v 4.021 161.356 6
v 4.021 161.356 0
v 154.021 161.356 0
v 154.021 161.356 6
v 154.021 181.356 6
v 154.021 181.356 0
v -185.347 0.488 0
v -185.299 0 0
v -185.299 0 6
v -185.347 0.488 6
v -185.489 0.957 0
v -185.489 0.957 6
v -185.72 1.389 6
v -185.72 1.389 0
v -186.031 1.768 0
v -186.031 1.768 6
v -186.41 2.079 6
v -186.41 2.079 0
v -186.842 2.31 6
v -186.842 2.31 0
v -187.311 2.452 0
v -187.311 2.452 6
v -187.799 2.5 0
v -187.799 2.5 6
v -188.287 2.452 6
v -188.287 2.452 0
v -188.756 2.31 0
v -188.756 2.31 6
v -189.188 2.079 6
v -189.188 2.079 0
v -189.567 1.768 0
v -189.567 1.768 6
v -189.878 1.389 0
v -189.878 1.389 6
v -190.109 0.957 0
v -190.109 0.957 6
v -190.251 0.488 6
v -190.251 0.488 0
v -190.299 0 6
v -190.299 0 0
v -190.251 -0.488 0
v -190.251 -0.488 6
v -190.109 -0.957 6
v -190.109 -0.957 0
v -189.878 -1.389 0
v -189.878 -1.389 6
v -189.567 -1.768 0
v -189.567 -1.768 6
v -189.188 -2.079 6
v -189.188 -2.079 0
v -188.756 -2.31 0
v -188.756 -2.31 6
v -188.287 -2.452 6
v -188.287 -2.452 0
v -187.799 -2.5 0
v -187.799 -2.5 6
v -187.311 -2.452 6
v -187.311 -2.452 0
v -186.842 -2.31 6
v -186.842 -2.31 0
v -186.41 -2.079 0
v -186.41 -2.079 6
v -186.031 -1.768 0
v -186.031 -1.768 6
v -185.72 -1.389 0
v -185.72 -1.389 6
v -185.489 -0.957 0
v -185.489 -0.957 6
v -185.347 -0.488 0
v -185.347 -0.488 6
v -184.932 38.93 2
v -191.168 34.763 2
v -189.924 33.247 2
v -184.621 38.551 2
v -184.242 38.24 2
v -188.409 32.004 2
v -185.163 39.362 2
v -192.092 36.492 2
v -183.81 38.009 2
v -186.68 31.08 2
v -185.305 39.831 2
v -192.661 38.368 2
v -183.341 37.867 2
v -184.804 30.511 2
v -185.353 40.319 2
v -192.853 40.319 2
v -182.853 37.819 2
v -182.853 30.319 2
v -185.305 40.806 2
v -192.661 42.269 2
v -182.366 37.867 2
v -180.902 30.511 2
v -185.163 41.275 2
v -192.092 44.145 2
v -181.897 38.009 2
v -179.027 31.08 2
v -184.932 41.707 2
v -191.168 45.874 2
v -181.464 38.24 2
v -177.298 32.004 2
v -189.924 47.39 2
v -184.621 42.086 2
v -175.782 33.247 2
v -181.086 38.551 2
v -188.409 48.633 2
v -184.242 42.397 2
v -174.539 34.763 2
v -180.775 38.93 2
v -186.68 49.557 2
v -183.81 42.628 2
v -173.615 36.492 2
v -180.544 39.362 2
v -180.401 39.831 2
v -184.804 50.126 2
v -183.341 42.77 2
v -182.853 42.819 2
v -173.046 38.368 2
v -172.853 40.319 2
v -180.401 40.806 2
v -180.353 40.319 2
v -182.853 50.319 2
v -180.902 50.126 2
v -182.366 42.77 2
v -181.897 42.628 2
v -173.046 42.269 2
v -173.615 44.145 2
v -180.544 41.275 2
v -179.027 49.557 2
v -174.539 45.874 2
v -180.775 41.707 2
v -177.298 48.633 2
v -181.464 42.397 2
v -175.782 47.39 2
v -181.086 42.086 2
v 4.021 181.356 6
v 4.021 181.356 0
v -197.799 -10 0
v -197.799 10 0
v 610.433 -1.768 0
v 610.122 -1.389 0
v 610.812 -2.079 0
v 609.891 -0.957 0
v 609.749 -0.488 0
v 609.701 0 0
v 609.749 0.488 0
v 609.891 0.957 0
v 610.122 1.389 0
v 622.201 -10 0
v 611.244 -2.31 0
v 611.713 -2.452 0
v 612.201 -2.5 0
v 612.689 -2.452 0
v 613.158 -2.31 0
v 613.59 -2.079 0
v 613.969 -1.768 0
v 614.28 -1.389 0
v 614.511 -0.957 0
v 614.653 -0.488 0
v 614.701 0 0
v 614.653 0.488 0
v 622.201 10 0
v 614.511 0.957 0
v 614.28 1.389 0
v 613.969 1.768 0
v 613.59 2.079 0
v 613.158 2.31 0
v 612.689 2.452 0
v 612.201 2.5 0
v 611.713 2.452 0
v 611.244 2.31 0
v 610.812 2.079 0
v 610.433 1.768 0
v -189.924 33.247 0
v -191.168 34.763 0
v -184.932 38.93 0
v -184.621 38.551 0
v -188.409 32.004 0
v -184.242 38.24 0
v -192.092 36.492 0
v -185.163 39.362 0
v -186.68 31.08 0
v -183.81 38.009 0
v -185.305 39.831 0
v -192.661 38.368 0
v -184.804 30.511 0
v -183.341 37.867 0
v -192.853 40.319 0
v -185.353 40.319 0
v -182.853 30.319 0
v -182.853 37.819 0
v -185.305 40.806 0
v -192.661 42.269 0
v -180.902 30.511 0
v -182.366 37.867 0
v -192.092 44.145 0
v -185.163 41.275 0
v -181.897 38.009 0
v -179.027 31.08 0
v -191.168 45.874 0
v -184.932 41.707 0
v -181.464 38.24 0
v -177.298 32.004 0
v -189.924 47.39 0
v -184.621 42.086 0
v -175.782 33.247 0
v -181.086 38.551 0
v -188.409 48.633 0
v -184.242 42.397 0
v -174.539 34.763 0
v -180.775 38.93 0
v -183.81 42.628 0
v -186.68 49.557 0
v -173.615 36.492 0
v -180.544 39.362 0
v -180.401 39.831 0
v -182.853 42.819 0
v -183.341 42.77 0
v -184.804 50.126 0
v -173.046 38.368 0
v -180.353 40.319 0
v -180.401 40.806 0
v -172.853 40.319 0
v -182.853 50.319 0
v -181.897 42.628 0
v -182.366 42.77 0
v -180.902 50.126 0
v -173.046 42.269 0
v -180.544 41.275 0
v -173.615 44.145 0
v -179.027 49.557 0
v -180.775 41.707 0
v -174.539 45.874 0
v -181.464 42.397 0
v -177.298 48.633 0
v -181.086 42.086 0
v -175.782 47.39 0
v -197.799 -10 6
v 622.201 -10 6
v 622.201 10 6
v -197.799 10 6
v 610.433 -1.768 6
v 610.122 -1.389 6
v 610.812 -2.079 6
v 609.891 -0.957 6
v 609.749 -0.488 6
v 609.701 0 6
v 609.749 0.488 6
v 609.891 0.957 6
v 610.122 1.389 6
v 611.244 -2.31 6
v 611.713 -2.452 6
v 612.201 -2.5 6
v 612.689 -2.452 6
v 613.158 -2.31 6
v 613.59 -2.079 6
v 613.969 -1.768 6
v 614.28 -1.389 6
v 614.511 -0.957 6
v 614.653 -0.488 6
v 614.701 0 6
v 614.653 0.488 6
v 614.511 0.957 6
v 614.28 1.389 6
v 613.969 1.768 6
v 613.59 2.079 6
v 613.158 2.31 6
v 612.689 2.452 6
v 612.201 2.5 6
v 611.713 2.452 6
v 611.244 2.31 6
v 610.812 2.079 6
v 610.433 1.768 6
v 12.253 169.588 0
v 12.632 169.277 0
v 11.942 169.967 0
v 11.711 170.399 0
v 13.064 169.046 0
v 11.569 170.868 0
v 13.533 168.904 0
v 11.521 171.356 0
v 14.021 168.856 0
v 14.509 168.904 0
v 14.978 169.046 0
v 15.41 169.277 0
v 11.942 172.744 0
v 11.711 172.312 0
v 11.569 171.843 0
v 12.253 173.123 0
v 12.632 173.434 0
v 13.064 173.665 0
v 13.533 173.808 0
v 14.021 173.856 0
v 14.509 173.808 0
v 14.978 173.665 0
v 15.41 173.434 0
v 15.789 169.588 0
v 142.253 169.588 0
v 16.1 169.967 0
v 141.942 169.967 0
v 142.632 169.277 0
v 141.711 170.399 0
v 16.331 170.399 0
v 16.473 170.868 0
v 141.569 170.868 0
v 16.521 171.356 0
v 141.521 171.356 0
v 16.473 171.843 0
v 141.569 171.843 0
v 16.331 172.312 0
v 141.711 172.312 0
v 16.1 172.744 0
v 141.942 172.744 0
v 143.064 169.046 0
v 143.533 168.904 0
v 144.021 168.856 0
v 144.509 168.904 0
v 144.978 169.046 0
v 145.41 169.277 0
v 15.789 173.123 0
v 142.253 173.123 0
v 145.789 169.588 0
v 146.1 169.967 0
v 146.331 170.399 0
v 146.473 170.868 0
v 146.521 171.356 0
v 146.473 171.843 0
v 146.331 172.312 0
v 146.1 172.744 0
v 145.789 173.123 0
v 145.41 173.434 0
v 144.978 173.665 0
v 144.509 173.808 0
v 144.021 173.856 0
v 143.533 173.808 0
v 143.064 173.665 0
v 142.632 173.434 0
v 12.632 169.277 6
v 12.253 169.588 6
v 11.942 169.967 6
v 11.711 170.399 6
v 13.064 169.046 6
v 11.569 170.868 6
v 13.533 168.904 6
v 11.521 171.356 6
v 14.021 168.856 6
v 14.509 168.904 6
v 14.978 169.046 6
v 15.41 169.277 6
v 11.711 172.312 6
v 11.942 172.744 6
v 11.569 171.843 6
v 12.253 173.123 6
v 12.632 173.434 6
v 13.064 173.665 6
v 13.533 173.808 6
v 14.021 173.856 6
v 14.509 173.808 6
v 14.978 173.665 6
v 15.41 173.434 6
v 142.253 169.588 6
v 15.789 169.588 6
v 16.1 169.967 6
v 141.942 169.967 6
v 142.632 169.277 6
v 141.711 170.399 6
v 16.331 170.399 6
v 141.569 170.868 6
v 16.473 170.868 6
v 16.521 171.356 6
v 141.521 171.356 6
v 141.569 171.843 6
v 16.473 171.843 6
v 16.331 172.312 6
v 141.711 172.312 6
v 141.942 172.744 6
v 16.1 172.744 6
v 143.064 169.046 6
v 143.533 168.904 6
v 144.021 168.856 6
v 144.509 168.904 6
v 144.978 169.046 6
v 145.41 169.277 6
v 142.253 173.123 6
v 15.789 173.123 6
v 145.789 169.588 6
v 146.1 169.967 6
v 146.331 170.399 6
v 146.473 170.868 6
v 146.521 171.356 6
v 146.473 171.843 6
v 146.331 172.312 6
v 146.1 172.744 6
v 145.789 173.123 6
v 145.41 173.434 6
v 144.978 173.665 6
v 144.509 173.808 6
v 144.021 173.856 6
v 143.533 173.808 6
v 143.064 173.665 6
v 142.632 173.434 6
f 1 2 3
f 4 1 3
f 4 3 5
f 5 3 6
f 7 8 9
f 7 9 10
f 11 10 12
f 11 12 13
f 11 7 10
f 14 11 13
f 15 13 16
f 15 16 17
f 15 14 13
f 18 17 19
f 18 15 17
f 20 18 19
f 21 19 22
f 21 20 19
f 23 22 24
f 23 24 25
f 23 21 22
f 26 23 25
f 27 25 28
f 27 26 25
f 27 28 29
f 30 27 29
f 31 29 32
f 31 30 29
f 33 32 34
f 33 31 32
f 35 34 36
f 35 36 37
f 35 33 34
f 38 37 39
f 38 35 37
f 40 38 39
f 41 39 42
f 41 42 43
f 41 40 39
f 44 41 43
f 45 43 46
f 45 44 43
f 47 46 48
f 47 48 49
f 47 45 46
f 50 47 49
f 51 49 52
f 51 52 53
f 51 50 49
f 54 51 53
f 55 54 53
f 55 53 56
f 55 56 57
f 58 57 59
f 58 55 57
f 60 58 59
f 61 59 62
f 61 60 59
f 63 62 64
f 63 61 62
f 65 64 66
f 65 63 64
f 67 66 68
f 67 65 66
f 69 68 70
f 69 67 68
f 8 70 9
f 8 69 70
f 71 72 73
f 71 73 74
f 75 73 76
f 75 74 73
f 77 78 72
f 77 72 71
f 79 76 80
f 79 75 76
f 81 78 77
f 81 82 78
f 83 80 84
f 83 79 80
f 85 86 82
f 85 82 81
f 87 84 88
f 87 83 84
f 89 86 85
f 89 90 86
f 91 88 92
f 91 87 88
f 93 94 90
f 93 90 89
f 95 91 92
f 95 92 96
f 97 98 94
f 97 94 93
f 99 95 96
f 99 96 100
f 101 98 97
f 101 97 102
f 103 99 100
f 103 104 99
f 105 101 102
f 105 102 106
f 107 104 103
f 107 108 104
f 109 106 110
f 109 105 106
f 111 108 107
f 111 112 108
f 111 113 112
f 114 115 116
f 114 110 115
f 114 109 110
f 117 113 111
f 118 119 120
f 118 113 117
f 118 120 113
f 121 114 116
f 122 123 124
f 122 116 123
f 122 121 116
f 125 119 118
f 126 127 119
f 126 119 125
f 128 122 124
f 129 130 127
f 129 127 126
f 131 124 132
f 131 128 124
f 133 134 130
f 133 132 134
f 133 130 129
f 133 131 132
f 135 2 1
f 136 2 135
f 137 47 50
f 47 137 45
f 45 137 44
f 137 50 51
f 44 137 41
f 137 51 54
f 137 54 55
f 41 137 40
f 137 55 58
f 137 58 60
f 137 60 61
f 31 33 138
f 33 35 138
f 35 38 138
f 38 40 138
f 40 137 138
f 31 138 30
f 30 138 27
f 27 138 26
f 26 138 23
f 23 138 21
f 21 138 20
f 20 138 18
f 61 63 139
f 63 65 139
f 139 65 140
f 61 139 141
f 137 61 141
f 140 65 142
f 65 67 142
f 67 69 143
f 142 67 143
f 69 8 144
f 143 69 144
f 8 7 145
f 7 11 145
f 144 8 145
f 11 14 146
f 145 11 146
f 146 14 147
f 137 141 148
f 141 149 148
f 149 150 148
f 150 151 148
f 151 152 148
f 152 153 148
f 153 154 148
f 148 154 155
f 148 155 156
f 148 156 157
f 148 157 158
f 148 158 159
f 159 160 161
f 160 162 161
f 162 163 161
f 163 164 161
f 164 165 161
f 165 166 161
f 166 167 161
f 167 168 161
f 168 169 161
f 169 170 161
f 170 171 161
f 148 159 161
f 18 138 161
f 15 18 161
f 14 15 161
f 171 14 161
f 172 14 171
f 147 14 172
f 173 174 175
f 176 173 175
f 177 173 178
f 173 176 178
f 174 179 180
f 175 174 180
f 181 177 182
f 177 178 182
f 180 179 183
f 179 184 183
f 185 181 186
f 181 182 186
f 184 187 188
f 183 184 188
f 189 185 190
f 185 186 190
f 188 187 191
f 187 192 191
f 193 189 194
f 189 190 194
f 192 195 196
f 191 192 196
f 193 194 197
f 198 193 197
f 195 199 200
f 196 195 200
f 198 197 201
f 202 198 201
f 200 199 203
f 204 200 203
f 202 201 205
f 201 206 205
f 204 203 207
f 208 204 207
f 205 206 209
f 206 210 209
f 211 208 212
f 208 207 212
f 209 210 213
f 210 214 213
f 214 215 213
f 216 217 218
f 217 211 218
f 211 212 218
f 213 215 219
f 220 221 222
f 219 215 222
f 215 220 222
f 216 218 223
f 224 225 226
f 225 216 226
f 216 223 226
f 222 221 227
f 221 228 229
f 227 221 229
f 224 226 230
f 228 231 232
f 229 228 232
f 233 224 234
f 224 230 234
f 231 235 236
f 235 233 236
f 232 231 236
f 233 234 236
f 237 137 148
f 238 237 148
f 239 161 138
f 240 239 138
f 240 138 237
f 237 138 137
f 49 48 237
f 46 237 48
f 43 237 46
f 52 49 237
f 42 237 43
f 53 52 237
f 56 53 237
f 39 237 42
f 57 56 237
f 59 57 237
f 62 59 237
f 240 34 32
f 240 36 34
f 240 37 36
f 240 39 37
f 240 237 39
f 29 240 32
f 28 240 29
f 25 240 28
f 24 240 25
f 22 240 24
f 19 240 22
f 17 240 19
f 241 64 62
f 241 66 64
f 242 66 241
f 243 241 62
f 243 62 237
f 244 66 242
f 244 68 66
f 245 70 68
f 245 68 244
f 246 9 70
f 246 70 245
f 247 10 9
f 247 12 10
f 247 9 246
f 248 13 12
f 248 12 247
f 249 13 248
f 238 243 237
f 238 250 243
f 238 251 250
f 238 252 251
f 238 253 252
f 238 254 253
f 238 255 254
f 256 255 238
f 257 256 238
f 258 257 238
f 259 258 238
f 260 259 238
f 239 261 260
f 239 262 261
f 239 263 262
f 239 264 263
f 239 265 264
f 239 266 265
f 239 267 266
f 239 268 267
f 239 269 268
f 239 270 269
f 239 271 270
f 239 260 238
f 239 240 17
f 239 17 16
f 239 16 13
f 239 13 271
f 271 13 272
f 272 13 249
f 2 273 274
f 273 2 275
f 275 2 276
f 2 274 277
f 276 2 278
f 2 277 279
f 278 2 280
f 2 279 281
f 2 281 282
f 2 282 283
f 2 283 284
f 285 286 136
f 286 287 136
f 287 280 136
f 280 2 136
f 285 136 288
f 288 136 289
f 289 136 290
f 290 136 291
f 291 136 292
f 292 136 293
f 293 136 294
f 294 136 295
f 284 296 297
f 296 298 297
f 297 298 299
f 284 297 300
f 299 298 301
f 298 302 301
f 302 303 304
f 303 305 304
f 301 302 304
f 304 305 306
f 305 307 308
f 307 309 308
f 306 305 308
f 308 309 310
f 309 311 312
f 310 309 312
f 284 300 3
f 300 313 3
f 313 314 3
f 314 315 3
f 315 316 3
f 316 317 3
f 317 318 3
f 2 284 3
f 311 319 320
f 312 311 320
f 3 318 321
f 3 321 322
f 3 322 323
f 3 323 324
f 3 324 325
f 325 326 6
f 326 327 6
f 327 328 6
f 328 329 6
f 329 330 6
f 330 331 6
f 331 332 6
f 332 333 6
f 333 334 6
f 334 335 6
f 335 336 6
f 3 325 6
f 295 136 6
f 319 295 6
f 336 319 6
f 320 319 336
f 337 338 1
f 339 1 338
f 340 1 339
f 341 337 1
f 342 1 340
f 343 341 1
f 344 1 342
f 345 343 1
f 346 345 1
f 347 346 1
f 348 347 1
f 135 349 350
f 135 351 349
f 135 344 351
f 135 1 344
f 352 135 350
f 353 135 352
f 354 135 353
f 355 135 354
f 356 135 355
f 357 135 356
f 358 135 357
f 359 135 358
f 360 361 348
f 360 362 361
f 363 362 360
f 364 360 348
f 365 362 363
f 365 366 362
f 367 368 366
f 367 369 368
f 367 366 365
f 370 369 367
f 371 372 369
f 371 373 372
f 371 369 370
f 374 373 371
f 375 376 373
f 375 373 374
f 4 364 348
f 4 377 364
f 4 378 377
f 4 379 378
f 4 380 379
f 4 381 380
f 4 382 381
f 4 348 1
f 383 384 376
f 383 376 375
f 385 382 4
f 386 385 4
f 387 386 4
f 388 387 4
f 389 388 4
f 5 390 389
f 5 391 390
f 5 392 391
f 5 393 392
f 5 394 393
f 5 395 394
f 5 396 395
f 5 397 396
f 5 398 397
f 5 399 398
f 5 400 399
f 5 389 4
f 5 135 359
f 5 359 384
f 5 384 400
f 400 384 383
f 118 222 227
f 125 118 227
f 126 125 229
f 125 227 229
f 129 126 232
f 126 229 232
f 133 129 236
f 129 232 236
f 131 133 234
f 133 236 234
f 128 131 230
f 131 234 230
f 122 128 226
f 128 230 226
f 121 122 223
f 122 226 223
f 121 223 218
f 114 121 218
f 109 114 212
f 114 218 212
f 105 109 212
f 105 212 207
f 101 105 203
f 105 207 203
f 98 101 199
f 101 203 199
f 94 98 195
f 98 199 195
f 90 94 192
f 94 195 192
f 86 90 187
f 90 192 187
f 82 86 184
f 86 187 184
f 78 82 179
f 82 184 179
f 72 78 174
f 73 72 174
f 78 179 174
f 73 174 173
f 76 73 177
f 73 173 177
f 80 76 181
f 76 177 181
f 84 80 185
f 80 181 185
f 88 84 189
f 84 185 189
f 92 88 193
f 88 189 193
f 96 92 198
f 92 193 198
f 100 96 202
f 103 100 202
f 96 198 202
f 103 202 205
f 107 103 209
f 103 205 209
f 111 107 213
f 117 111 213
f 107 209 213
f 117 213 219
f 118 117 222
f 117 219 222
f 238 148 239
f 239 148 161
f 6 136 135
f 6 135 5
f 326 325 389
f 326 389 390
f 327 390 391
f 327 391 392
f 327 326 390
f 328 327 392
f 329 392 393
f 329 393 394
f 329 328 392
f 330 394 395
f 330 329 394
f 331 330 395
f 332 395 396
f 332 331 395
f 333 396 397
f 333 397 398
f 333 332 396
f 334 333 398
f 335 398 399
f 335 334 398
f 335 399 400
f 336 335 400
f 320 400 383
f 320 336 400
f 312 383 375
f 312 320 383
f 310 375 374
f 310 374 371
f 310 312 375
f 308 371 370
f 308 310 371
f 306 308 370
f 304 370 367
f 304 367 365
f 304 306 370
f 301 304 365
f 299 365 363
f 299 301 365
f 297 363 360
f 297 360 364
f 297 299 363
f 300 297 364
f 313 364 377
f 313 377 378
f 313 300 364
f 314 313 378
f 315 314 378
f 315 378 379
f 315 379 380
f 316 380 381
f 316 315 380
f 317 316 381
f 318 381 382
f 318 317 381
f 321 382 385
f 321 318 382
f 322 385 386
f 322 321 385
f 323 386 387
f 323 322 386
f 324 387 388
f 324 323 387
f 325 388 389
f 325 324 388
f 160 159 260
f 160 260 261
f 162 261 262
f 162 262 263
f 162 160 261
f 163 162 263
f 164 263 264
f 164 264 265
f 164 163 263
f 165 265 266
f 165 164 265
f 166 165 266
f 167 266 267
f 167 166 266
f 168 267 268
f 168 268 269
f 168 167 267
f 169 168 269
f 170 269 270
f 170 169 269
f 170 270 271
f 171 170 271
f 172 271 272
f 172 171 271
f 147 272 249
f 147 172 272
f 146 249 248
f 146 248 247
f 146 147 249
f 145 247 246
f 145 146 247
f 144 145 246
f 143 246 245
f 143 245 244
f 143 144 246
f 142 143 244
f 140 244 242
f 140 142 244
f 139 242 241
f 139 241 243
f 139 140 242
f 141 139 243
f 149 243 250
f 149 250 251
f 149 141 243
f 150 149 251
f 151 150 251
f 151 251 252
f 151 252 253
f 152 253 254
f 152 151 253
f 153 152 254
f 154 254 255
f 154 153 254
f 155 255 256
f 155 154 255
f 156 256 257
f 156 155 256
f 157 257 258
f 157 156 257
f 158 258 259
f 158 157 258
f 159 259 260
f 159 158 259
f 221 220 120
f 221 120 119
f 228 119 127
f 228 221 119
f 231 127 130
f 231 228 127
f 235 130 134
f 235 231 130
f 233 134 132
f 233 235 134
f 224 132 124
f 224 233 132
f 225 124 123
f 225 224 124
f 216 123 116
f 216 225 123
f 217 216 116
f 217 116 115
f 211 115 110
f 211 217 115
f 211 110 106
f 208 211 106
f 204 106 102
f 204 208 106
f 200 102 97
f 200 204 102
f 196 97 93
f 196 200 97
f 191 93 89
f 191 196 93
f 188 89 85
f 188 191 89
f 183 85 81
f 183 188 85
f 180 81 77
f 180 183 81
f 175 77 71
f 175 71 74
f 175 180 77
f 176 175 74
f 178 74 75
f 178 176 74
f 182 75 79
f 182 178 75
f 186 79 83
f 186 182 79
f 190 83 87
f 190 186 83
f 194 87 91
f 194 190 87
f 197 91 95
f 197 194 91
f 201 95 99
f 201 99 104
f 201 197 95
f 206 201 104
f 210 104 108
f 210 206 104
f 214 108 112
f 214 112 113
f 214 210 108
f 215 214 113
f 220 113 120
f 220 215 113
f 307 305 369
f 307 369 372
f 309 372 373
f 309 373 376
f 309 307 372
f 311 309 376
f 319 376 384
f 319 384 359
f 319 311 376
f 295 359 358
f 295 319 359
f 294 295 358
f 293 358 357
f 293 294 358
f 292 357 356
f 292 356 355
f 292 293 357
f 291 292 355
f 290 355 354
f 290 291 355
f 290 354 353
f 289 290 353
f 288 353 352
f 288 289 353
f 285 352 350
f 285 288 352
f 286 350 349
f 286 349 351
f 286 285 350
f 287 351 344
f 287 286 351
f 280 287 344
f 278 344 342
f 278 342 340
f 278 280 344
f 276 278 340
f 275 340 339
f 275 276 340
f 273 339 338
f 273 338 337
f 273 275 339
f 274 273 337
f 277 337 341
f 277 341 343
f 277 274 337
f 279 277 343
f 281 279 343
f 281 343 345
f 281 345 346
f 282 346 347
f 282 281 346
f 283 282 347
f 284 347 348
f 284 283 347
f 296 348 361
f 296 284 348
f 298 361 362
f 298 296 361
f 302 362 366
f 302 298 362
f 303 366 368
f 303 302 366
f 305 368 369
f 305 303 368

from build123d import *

# Parameters (mm, degrees)
F0_R     = 2.5
F1_DEPTH = 6
F2_R     = 10
F2_R_2   = 2.5
F3_DEPTH = 2
F4_W     = 150
F4_H     = 20
F4_R     = 2.5
F5_DEPTH = 6


with BuildPart() as f1:
    # F0 (on Top) → F1 (new body)
    with BuildSketch(Plane.XY):
        Polygon((622.201137, -10), (622.201137, 0), (622.201137, 10), (-197.798863, 10), (-197.798863, 0), (-197.798863, -10), align=None)
        with Locations((-187.798863, 0)):
            Circle(F0_R, mode=Mode.SUBTRACT)
        with Locations((612.201137, 0)):
            Circle(F0_R, mode=Mode.SUBTRACT)
    extrude(amount=F1_DEPTH)


with BuildPart() as f3:
    # F2 (on Top) → F3 (new body)
    with BuildSketch(Plane.XY):
        with Locations((-182.853356, 40.318504)):
            Circle(F2_R)
        with Locations((-182.853356, 40.318504)):
            Circle(F2_R_2, mode=Mode.SUBTRACT)
    extrude(amount=F3_DEPTH)


with BuildPart() as f5:
    # F4 (on Top) → F5 (new body)
    with BuildSketch(Plane.XY):
        with Locations((79.020846, 171.35557)):
            Rectangle(F4_W, F4_H)
        with Locations((14.020846, 171.35557)):
            Circle(F4_R, mode=Mode.SUBTRACT)
        with Locations((144.020846, 171.35557)):
            Circle(F4_R, mode=Mode.SUBTRACT)
    extrude(amount=F5_DEPTH)


solid = Compound([f1.part, f3.part, f5.part])
